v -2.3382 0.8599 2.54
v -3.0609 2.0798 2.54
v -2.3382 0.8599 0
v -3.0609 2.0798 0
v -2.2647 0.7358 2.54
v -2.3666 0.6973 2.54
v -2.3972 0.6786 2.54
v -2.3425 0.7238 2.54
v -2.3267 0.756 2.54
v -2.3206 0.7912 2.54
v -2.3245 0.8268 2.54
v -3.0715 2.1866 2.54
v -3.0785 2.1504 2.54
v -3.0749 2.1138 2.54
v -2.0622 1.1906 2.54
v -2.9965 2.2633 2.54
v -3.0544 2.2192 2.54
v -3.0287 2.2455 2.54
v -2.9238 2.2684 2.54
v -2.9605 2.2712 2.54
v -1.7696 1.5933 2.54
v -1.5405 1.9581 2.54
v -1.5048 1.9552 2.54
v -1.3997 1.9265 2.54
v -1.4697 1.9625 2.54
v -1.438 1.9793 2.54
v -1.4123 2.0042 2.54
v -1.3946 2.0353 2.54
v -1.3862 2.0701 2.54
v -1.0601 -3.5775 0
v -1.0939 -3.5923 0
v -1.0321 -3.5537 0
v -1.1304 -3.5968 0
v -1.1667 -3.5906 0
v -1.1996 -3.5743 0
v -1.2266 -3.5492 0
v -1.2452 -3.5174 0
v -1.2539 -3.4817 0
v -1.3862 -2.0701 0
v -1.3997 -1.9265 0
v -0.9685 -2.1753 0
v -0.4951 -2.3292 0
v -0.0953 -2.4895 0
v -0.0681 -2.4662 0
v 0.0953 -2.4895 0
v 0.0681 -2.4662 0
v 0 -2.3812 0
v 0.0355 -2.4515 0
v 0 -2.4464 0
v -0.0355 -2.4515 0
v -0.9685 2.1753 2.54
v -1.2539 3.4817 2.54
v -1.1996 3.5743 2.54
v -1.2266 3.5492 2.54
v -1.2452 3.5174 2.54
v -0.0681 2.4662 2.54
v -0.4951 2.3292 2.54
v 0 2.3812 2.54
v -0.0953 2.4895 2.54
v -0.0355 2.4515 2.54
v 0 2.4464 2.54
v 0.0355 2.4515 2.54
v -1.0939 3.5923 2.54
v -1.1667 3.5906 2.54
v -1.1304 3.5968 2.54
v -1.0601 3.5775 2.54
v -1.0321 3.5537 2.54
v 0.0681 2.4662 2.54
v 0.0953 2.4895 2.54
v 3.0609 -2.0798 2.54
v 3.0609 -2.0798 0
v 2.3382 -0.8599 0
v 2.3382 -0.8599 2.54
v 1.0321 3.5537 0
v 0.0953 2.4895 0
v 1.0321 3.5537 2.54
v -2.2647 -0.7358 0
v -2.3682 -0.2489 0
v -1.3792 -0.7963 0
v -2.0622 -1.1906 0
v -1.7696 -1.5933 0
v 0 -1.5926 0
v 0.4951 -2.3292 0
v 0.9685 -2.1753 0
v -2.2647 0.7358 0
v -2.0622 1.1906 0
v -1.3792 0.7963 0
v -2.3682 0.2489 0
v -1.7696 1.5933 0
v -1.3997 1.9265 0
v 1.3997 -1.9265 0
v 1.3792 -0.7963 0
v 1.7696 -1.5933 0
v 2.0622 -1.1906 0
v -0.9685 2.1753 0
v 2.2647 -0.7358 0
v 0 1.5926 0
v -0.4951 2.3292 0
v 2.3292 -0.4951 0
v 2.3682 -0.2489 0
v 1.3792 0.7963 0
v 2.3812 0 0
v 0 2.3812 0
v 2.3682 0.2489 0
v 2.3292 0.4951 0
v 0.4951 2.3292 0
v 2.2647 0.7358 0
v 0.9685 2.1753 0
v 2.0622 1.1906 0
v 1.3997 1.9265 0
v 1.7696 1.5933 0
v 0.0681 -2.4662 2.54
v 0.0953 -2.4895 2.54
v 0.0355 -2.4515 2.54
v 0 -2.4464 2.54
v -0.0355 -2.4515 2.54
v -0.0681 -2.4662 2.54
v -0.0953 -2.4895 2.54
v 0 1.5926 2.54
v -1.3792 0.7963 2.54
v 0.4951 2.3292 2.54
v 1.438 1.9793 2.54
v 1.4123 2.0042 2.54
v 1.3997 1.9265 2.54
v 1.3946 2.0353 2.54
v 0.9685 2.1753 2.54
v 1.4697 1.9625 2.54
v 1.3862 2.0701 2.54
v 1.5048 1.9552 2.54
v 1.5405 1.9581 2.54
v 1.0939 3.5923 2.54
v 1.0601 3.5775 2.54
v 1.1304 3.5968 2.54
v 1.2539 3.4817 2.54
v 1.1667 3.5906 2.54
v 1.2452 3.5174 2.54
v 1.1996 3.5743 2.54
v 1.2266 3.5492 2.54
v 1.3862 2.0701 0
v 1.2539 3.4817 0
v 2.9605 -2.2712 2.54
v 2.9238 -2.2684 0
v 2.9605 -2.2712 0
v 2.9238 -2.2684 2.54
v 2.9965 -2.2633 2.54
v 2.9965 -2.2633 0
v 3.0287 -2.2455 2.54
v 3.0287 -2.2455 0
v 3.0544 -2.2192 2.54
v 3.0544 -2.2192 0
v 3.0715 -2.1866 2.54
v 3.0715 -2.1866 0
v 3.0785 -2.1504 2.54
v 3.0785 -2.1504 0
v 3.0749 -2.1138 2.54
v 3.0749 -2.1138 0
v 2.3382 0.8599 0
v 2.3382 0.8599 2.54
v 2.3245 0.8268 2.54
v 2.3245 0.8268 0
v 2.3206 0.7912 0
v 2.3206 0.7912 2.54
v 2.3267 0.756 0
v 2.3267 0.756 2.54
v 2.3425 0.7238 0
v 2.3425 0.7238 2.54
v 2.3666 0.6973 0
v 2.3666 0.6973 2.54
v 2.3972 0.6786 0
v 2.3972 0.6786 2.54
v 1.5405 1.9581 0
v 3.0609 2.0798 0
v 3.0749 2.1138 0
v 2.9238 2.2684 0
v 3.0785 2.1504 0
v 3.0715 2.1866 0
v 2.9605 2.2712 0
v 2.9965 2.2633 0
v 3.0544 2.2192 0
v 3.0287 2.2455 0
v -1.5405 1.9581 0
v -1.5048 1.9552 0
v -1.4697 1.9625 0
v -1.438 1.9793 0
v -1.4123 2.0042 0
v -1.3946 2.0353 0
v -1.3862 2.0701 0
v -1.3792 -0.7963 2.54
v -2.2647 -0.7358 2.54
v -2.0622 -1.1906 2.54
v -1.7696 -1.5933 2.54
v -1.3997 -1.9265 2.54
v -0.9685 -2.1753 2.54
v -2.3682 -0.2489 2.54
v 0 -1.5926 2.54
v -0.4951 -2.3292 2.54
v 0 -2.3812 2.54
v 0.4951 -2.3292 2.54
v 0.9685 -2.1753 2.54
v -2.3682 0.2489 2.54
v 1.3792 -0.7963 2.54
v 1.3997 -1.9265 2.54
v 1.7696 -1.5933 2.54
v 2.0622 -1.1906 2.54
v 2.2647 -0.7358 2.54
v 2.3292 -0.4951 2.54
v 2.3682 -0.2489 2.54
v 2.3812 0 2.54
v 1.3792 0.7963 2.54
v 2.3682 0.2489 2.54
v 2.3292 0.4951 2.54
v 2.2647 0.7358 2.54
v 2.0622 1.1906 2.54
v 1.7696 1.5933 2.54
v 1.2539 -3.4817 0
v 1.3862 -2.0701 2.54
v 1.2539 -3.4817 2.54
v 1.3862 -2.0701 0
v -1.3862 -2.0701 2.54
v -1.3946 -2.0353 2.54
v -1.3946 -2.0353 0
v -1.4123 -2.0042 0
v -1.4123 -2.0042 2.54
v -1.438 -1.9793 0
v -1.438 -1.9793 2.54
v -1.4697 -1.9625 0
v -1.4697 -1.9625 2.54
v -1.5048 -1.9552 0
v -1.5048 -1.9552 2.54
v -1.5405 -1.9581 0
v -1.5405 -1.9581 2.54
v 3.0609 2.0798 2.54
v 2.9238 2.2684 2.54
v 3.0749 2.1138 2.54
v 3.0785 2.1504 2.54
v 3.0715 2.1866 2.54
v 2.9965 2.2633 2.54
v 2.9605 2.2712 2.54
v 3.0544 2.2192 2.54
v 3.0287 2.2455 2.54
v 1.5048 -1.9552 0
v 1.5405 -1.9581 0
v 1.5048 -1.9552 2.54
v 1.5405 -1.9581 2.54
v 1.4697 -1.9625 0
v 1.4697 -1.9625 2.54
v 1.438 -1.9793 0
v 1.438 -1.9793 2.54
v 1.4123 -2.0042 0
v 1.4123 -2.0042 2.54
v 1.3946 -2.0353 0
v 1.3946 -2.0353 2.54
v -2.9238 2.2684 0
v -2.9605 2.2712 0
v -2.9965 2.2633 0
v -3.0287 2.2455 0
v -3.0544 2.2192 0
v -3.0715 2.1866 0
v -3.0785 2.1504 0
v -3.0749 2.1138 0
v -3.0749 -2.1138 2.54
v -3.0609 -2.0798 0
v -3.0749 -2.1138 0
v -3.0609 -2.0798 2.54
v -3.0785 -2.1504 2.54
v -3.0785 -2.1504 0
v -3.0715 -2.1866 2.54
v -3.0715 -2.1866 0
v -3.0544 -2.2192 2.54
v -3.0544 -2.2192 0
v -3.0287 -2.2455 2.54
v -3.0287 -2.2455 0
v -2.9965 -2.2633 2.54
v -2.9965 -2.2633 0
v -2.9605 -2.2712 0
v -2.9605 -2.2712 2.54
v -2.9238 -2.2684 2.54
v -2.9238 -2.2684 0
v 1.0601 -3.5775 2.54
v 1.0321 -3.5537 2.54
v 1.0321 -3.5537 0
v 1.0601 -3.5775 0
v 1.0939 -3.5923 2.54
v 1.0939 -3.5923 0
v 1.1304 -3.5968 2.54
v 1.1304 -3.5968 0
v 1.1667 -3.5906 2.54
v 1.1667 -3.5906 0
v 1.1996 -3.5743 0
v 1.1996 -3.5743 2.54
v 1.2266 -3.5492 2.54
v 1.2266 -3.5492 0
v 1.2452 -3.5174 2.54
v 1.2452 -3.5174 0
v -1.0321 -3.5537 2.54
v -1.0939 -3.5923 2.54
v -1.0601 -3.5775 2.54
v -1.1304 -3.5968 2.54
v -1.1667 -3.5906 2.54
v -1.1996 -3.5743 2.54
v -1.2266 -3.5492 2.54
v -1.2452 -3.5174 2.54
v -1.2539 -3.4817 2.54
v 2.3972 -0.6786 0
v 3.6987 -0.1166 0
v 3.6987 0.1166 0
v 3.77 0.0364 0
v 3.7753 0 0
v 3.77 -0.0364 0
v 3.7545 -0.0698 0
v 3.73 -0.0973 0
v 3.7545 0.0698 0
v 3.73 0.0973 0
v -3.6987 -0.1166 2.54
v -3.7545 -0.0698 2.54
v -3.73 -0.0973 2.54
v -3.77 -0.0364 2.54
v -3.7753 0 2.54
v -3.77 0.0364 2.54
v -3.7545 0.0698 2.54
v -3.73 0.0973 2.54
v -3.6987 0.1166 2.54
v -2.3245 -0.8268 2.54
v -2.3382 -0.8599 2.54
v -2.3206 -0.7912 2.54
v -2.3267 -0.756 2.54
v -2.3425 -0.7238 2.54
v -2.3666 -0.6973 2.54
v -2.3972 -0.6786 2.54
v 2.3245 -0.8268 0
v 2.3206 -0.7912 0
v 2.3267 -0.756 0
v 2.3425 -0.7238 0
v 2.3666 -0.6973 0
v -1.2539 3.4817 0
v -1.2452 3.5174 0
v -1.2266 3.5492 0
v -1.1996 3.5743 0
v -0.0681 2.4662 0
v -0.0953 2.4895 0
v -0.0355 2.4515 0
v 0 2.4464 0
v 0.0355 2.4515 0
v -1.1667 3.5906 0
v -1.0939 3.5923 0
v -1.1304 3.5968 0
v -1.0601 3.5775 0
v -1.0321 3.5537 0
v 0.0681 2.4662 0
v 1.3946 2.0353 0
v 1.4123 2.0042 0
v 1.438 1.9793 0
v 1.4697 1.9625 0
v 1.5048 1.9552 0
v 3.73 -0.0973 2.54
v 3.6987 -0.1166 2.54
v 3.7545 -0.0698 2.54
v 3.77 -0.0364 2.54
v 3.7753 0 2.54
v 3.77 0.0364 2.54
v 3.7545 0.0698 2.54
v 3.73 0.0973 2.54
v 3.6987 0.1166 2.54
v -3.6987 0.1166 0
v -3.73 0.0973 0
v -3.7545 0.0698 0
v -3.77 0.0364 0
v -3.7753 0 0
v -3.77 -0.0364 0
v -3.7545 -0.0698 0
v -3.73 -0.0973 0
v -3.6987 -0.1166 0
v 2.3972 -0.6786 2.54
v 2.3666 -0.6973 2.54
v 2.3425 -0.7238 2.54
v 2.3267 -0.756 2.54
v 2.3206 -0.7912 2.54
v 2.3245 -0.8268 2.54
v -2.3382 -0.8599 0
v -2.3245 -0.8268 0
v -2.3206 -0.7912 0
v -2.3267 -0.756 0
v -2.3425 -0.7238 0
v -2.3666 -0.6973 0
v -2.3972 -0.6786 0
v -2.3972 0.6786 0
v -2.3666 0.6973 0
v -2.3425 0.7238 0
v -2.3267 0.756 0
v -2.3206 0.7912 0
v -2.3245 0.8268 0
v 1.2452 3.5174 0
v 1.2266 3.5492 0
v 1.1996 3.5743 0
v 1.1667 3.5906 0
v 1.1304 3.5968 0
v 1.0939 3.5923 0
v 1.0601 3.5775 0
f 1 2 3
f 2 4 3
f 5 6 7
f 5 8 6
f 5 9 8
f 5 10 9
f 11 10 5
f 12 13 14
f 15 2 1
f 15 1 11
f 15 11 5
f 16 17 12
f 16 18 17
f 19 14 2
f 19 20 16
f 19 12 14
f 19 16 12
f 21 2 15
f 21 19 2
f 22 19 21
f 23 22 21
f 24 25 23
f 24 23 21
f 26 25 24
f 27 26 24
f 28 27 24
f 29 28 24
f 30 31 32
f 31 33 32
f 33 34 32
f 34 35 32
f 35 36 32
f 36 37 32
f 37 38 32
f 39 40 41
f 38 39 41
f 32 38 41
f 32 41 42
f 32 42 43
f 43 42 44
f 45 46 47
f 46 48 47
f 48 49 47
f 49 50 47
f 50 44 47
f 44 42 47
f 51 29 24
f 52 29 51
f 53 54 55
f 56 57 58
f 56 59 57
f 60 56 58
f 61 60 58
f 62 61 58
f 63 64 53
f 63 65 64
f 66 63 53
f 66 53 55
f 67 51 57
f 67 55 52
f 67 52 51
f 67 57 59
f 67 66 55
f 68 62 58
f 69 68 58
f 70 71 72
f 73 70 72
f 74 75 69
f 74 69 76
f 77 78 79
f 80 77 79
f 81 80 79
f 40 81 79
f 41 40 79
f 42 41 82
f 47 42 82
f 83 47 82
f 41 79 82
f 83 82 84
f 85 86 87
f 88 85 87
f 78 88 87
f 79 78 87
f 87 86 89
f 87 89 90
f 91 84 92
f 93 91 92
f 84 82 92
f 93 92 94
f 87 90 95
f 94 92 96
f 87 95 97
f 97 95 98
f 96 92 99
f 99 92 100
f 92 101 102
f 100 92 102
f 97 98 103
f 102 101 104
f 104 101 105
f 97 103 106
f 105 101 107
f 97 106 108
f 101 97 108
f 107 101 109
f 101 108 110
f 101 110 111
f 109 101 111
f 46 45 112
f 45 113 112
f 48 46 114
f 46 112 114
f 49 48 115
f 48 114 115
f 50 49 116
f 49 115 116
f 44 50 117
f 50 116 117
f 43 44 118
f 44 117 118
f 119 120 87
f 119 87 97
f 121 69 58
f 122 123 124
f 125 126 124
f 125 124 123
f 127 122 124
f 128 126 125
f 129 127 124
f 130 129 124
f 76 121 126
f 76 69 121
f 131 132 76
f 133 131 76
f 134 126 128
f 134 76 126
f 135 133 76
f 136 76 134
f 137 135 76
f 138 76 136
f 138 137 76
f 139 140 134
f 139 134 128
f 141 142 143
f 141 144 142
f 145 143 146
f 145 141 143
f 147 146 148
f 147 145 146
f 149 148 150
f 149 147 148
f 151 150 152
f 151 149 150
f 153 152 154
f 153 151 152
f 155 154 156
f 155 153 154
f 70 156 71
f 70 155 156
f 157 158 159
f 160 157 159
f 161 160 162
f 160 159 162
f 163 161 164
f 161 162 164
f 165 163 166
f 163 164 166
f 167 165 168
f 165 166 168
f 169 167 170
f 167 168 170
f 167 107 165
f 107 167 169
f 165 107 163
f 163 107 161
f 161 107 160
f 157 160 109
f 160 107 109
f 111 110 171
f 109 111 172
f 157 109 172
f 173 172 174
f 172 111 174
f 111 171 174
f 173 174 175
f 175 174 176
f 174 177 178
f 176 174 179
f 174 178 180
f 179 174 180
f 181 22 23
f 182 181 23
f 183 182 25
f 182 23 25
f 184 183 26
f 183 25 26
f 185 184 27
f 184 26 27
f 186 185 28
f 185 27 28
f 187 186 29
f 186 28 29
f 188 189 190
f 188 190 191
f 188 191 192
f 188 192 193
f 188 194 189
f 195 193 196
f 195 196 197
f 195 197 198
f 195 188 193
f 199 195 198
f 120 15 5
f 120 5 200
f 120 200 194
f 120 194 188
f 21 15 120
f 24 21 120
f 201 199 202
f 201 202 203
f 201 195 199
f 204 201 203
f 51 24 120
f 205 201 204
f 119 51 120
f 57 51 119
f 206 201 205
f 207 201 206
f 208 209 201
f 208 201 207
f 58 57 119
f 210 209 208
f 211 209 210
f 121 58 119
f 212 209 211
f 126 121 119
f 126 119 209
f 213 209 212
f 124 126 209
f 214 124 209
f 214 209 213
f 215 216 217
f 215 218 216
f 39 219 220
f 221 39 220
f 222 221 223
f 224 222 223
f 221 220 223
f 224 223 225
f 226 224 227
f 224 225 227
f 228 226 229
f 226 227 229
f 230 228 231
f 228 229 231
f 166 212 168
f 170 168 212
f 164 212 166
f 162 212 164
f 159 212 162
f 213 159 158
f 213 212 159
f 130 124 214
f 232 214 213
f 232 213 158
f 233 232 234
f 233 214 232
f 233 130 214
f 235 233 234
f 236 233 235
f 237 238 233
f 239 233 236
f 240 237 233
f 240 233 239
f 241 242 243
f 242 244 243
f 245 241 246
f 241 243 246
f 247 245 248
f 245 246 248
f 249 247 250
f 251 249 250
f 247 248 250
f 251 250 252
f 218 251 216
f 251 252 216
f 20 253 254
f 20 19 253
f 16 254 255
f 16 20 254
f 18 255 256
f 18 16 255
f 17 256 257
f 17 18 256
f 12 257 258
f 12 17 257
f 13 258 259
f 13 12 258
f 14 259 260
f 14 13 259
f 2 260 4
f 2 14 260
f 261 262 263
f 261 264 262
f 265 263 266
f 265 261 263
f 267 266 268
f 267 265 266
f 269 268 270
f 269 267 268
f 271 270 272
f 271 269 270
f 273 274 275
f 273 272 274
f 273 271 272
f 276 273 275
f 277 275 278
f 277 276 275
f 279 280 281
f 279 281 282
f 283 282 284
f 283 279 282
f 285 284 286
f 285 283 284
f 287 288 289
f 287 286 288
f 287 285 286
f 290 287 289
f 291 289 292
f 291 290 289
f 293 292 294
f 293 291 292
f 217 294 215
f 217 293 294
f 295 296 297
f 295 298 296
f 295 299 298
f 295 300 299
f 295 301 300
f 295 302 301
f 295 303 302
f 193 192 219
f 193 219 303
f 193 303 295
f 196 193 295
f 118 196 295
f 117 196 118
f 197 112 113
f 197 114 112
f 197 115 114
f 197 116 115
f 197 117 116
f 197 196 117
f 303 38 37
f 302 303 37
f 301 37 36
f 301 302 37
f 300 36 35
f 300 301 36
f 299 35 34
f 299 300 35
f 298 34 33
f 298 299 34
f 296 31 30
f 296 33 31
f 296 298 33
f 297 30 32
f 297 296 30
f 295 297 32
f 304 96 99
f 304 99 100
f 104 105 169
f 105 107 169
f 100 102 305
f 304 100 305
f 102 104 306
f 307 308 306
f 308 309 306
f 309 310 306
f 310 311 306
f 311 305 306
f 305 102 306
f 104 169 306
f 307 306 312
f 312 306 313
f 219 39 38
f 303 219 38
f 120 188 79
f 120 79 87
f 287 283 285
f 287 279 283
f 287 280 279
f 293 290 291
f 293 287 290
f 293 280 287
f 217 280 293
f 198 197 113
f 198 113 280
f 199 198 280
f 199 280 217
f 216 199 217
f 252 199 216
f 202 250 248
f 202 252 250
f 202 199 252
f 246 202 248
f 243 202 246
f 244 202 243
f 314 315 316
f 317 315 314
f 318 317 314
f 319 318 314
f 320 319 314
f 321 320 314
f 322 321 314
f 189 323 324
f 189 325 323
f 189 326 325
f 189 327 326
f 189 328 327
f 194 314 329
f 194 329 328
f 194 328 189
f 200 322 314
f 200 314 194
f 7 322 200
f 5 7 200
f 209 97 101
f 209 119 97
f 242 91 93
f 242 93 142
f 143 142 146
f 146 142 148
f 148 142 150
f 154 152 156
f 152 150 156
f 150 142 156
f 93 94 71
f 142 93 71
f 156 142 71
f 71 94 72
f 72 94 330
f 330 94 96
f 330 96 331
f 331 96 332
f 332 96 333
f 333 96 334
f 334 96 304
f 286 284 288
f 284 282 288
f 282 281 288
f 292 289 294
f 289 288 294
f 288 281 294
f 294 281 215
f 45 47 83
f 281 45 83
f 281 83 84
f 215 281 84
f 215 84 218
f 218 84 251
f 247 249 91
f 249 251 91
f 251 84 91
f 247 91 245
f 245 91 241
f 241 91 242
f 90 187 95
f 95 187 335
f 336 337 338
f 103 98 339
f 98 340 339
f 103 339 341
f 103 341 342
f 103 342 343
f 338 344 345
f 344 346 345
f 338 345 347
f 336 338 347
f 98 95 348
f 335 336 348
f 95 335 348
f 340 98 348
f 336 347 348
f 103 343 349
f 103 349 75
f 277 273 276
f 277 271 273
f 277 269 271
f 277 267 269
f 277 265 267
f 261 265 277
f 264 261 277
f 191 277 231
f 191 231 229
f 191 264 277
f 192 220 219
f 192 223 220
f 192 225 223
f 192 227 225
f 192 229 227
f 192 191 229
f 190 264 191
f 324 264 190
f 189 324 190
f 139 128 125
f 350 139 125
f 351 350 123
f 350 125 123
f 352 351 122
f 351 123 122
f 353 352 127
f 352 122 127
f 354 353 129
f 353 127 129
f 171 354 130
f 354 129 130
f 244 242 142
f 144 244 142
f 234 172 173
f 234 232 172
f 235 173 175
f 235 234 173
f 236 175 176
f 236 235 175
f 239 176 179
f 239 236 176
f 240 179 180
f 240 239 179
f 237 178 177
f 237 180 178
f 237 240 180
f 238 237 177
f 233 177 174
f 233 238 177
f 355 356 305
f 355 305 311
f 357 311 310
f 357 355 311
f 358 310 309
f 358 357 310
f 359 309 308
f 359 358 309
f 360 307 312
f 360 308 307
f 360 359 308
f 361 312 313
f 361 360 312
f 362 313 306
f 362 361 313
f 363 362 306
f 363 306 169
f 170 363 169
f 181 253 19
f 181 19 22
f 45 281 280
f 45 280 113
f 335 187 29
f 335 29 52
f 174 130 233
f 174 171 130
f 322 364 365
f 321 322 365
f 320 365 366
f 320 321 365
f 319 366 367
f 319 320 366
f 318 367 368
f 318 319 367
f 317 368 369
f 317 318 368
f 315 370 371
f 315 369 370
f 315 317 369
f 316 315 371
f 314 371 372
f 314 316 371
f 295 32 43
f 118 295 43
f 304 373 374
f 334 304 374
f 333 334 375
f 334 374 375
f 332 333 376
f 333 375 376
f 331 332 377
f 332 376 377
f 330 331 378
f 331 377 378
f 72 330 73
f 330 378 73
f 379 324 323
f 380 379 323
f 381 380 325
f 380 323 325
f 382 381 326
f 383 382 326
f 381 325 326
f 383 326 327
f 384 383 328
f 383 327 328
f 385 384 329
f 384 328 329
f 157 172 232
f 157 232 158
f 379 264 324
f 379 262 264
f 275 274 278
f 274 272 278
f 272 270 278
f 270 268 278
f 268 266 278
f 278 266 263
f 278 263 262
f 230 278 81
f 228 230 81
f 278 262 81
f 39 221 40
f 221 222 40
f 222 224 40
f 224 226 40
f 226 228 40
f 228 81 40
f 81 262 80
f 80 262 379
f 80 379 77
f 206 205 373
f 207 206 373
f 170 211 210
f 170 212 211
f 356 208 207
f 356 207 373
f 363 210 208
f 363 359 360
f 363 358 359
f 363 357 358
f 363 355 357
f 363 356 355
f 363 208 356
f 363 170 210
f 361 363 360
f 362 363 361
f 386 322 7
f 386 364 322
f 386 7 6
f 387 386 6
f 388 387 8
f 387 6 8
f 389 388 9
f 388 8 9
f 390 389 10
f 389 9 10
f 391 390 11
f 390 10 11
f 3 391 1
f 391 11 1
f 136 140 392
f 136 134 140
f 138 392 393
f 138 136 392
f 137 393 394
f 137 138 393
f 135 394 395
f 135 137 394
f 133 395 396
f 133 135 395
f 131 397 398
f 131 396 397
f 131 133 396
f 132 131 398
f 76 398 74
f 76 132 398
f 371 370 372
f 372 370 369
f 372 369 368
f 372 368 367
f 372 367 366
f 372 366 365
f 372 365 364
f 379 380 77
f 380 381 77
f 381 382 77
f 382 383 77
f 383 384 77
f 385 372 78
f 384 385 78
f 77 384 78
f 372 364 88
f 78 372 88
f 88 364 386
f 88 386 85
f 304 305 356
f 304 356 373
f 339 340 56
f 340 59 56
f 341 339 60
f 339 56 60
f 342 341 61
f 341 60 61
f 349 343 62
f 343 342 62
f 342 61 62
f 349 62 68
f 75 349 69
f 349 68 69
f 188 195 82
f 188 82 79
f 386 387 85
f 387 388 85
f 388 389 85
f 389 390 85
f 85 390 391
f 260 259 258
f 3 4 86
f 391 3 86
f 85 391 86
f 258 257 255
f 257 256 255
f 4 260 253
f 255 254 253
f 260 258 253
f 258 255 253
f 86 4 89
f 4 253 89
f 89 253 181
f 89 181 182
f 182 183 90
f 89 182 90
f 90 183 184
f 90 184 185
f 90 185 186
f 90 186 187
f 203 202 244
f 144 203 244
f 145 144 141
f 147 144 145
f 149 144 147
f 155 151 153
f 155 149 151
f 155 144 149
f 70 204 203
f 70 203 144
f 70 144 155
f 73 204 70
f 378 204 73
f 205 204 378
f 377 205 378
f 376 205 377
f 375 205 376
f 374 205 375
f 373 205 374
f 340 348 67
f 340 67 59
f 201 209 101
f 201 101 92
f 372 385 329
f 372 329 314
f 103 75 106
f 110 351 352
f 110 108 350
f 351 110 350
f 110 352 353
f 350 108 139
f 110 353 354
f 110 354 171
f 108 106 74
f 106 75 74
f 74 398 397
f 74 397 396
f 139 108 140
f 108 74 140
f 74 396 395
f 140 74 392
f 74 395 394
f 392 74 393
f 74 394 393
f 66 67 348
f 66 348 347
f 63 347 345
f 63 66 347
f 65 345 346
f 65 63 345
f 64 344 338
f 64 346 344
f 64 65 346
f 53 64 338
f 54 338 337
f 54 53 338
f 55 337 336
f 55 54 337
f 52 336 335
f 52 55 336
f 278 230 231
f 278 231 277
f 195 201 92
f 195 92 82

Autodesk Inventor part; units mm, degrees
ref_plane "YZ Plane" through (0, 0, 0) normal (1, 0, 0) x (0, 1, 0)
ref_plane "XZ Plane" through (0, 0, 0) normal (0, 1, 0) x (-1, 0, 0)
ref_plane "XY Plane" through (0, 0, 0) normal (0, 0, 1) x (1, 0, 0)
sketch "Sketch1" plane through (0, 0, 0) normal (0, 0, 1) x (1, 0, 0)
  circle A0 centre (0, 0) radius 2.3812 construction
  circle A1 centre (0, 0) radius 3.9687 construction
  circle A2 centre (0, 0) radius 2.3812
  circle A3 centre (0, 0) radius 2.3812
  circle A4 centre (0, 0) radius 2.3812
  circle A5 centre (0, 0) radius 2.3812
  circle A6 centre (0, 0) radius 2.3812
  circle A7 centre (0, 0) radius 2.3812
  circle A8 centre (0, 0) radius 2.3812
  circle A9 centre (0, 0) radius 2.3812
  circle A10 centre (0, 0) radius 2.3812
  line L0 (-1.3997, 1.9265) -> (-1.2264, 3.7745)
  line L1 (-1.2264, 3.7745) -> (0, 2.3812)
  line L2 (1.3997, 1.9265) -> (3.2108, 2.3328)
  line L3 (3.2108, 2.3328) -> (2.2647, 0.7358)
  line L4 (3.9687, 0) -> (2.2647, 0.7358)
  line L5 (3.9687, 0) -> (2.2647, -0.7358)
  line L6 (3.2108, -2.3328) -> (2.2647, -0.7358)
  line L7 (1.3997, -1.9265) -> (3.2108, -2.3328)
  line L8 (1.3997, -1.9265) -> (1.2264, -3.7745)
  line L9 (1.2264, -3.7745) -> (0, -2.3812)
  line L10 (-1.2264, -3.7745) -> (0, -2.3812)
  line L11 (-1.3997, -1.9265) -> (-1.2264, -3.7745)
  line L12 (-1.3997, -1.9265) -> (-3.2108, -2.3328)
  line L13 (-3.2108, -2.3328) -> (-2.2647, -0.7358)
  line L14 (-2.2647, -0.7358) -> (-3.9687, 0)
  line L15 (-3.9687, 0) -> (-2.2647, 0.7358)
  line L16 (-3.2108, 2.3328) -> (-2.2647, 0.7358)
  line L17 (-3.2108, 2.3328) -> (-1.3997, 1.9265)
  line L18 (0, 2.3812) -> (1.2264, 3.7745)
  line L19 (1.2264, 3.7745) -> (1.3997, 1.9265)
  dimension "d0" = 4.7625
  dimension "d1" = 7.9375
  dimension "d4" = 360
  dimension "d6" = 82.712
extrude "Extrusion1" add sketch "Sketch1" along normal blind 2.54
sketch "Sketch2" plane through (0, 0, 2.54) normal (0, 0, 1) x (1, 0, 0)
  line L0 (0, 1.5926) -> (1.3792, 0.7963)
  line L1 (1.3792, 0.7963) -> (1.3792, -0.7963)
  line L2 (1.3792, -0.7963) -> (0, -1.5926)
  line L3 (0, -1.5926) -> (-1.3792, -0.7963)
  line L4 (-1.3792, -0.7963) -> (-1.3792, 0.7963)
  line L5 (-1.3792, 0.7963) -> (0, 1.5926)
  point P0 (0, 0)
  point P1 (0, 0)
  dimension "d9" = 3.1852
  dimension "d10" = 1.3792
extrude "Extrusion2" cut sketch "Sketch2" against normal through all
fillet "Fillet1" radius 0.127 20 edges at (-3.2108, -2.3328, 1.27) (-3.9687, 0, 1.27) (-3.2108, 2.3328, 1.27) (-1.2264, 3.7745, 1.27) (1.2264, 3.7745, 1.27) (3.2108, 2.3328, 1.27) (3.9687, 0, 1.27) (3.2108, -2.3328, 1.27) (1.2264, -3.7745, 1.27) (-1.2264, -3.7745, 1.27) (0, -2.3812, 1.27) (1.3997, -1.9265, 1.27) (2.2647, 0.7358, 1.27) (2.2647, -0.7358, 1.27) (1.3997, 1.9265, 1.27) (0, 2.3812, 1.27) (-1.3997, 1.9265, 1.27) (-2.2647, 0.7358, 1.27) (-2.2647, -0.7358, 1.27) (-1.3997, -1.9265, 1.27)
properties part number "000113"
